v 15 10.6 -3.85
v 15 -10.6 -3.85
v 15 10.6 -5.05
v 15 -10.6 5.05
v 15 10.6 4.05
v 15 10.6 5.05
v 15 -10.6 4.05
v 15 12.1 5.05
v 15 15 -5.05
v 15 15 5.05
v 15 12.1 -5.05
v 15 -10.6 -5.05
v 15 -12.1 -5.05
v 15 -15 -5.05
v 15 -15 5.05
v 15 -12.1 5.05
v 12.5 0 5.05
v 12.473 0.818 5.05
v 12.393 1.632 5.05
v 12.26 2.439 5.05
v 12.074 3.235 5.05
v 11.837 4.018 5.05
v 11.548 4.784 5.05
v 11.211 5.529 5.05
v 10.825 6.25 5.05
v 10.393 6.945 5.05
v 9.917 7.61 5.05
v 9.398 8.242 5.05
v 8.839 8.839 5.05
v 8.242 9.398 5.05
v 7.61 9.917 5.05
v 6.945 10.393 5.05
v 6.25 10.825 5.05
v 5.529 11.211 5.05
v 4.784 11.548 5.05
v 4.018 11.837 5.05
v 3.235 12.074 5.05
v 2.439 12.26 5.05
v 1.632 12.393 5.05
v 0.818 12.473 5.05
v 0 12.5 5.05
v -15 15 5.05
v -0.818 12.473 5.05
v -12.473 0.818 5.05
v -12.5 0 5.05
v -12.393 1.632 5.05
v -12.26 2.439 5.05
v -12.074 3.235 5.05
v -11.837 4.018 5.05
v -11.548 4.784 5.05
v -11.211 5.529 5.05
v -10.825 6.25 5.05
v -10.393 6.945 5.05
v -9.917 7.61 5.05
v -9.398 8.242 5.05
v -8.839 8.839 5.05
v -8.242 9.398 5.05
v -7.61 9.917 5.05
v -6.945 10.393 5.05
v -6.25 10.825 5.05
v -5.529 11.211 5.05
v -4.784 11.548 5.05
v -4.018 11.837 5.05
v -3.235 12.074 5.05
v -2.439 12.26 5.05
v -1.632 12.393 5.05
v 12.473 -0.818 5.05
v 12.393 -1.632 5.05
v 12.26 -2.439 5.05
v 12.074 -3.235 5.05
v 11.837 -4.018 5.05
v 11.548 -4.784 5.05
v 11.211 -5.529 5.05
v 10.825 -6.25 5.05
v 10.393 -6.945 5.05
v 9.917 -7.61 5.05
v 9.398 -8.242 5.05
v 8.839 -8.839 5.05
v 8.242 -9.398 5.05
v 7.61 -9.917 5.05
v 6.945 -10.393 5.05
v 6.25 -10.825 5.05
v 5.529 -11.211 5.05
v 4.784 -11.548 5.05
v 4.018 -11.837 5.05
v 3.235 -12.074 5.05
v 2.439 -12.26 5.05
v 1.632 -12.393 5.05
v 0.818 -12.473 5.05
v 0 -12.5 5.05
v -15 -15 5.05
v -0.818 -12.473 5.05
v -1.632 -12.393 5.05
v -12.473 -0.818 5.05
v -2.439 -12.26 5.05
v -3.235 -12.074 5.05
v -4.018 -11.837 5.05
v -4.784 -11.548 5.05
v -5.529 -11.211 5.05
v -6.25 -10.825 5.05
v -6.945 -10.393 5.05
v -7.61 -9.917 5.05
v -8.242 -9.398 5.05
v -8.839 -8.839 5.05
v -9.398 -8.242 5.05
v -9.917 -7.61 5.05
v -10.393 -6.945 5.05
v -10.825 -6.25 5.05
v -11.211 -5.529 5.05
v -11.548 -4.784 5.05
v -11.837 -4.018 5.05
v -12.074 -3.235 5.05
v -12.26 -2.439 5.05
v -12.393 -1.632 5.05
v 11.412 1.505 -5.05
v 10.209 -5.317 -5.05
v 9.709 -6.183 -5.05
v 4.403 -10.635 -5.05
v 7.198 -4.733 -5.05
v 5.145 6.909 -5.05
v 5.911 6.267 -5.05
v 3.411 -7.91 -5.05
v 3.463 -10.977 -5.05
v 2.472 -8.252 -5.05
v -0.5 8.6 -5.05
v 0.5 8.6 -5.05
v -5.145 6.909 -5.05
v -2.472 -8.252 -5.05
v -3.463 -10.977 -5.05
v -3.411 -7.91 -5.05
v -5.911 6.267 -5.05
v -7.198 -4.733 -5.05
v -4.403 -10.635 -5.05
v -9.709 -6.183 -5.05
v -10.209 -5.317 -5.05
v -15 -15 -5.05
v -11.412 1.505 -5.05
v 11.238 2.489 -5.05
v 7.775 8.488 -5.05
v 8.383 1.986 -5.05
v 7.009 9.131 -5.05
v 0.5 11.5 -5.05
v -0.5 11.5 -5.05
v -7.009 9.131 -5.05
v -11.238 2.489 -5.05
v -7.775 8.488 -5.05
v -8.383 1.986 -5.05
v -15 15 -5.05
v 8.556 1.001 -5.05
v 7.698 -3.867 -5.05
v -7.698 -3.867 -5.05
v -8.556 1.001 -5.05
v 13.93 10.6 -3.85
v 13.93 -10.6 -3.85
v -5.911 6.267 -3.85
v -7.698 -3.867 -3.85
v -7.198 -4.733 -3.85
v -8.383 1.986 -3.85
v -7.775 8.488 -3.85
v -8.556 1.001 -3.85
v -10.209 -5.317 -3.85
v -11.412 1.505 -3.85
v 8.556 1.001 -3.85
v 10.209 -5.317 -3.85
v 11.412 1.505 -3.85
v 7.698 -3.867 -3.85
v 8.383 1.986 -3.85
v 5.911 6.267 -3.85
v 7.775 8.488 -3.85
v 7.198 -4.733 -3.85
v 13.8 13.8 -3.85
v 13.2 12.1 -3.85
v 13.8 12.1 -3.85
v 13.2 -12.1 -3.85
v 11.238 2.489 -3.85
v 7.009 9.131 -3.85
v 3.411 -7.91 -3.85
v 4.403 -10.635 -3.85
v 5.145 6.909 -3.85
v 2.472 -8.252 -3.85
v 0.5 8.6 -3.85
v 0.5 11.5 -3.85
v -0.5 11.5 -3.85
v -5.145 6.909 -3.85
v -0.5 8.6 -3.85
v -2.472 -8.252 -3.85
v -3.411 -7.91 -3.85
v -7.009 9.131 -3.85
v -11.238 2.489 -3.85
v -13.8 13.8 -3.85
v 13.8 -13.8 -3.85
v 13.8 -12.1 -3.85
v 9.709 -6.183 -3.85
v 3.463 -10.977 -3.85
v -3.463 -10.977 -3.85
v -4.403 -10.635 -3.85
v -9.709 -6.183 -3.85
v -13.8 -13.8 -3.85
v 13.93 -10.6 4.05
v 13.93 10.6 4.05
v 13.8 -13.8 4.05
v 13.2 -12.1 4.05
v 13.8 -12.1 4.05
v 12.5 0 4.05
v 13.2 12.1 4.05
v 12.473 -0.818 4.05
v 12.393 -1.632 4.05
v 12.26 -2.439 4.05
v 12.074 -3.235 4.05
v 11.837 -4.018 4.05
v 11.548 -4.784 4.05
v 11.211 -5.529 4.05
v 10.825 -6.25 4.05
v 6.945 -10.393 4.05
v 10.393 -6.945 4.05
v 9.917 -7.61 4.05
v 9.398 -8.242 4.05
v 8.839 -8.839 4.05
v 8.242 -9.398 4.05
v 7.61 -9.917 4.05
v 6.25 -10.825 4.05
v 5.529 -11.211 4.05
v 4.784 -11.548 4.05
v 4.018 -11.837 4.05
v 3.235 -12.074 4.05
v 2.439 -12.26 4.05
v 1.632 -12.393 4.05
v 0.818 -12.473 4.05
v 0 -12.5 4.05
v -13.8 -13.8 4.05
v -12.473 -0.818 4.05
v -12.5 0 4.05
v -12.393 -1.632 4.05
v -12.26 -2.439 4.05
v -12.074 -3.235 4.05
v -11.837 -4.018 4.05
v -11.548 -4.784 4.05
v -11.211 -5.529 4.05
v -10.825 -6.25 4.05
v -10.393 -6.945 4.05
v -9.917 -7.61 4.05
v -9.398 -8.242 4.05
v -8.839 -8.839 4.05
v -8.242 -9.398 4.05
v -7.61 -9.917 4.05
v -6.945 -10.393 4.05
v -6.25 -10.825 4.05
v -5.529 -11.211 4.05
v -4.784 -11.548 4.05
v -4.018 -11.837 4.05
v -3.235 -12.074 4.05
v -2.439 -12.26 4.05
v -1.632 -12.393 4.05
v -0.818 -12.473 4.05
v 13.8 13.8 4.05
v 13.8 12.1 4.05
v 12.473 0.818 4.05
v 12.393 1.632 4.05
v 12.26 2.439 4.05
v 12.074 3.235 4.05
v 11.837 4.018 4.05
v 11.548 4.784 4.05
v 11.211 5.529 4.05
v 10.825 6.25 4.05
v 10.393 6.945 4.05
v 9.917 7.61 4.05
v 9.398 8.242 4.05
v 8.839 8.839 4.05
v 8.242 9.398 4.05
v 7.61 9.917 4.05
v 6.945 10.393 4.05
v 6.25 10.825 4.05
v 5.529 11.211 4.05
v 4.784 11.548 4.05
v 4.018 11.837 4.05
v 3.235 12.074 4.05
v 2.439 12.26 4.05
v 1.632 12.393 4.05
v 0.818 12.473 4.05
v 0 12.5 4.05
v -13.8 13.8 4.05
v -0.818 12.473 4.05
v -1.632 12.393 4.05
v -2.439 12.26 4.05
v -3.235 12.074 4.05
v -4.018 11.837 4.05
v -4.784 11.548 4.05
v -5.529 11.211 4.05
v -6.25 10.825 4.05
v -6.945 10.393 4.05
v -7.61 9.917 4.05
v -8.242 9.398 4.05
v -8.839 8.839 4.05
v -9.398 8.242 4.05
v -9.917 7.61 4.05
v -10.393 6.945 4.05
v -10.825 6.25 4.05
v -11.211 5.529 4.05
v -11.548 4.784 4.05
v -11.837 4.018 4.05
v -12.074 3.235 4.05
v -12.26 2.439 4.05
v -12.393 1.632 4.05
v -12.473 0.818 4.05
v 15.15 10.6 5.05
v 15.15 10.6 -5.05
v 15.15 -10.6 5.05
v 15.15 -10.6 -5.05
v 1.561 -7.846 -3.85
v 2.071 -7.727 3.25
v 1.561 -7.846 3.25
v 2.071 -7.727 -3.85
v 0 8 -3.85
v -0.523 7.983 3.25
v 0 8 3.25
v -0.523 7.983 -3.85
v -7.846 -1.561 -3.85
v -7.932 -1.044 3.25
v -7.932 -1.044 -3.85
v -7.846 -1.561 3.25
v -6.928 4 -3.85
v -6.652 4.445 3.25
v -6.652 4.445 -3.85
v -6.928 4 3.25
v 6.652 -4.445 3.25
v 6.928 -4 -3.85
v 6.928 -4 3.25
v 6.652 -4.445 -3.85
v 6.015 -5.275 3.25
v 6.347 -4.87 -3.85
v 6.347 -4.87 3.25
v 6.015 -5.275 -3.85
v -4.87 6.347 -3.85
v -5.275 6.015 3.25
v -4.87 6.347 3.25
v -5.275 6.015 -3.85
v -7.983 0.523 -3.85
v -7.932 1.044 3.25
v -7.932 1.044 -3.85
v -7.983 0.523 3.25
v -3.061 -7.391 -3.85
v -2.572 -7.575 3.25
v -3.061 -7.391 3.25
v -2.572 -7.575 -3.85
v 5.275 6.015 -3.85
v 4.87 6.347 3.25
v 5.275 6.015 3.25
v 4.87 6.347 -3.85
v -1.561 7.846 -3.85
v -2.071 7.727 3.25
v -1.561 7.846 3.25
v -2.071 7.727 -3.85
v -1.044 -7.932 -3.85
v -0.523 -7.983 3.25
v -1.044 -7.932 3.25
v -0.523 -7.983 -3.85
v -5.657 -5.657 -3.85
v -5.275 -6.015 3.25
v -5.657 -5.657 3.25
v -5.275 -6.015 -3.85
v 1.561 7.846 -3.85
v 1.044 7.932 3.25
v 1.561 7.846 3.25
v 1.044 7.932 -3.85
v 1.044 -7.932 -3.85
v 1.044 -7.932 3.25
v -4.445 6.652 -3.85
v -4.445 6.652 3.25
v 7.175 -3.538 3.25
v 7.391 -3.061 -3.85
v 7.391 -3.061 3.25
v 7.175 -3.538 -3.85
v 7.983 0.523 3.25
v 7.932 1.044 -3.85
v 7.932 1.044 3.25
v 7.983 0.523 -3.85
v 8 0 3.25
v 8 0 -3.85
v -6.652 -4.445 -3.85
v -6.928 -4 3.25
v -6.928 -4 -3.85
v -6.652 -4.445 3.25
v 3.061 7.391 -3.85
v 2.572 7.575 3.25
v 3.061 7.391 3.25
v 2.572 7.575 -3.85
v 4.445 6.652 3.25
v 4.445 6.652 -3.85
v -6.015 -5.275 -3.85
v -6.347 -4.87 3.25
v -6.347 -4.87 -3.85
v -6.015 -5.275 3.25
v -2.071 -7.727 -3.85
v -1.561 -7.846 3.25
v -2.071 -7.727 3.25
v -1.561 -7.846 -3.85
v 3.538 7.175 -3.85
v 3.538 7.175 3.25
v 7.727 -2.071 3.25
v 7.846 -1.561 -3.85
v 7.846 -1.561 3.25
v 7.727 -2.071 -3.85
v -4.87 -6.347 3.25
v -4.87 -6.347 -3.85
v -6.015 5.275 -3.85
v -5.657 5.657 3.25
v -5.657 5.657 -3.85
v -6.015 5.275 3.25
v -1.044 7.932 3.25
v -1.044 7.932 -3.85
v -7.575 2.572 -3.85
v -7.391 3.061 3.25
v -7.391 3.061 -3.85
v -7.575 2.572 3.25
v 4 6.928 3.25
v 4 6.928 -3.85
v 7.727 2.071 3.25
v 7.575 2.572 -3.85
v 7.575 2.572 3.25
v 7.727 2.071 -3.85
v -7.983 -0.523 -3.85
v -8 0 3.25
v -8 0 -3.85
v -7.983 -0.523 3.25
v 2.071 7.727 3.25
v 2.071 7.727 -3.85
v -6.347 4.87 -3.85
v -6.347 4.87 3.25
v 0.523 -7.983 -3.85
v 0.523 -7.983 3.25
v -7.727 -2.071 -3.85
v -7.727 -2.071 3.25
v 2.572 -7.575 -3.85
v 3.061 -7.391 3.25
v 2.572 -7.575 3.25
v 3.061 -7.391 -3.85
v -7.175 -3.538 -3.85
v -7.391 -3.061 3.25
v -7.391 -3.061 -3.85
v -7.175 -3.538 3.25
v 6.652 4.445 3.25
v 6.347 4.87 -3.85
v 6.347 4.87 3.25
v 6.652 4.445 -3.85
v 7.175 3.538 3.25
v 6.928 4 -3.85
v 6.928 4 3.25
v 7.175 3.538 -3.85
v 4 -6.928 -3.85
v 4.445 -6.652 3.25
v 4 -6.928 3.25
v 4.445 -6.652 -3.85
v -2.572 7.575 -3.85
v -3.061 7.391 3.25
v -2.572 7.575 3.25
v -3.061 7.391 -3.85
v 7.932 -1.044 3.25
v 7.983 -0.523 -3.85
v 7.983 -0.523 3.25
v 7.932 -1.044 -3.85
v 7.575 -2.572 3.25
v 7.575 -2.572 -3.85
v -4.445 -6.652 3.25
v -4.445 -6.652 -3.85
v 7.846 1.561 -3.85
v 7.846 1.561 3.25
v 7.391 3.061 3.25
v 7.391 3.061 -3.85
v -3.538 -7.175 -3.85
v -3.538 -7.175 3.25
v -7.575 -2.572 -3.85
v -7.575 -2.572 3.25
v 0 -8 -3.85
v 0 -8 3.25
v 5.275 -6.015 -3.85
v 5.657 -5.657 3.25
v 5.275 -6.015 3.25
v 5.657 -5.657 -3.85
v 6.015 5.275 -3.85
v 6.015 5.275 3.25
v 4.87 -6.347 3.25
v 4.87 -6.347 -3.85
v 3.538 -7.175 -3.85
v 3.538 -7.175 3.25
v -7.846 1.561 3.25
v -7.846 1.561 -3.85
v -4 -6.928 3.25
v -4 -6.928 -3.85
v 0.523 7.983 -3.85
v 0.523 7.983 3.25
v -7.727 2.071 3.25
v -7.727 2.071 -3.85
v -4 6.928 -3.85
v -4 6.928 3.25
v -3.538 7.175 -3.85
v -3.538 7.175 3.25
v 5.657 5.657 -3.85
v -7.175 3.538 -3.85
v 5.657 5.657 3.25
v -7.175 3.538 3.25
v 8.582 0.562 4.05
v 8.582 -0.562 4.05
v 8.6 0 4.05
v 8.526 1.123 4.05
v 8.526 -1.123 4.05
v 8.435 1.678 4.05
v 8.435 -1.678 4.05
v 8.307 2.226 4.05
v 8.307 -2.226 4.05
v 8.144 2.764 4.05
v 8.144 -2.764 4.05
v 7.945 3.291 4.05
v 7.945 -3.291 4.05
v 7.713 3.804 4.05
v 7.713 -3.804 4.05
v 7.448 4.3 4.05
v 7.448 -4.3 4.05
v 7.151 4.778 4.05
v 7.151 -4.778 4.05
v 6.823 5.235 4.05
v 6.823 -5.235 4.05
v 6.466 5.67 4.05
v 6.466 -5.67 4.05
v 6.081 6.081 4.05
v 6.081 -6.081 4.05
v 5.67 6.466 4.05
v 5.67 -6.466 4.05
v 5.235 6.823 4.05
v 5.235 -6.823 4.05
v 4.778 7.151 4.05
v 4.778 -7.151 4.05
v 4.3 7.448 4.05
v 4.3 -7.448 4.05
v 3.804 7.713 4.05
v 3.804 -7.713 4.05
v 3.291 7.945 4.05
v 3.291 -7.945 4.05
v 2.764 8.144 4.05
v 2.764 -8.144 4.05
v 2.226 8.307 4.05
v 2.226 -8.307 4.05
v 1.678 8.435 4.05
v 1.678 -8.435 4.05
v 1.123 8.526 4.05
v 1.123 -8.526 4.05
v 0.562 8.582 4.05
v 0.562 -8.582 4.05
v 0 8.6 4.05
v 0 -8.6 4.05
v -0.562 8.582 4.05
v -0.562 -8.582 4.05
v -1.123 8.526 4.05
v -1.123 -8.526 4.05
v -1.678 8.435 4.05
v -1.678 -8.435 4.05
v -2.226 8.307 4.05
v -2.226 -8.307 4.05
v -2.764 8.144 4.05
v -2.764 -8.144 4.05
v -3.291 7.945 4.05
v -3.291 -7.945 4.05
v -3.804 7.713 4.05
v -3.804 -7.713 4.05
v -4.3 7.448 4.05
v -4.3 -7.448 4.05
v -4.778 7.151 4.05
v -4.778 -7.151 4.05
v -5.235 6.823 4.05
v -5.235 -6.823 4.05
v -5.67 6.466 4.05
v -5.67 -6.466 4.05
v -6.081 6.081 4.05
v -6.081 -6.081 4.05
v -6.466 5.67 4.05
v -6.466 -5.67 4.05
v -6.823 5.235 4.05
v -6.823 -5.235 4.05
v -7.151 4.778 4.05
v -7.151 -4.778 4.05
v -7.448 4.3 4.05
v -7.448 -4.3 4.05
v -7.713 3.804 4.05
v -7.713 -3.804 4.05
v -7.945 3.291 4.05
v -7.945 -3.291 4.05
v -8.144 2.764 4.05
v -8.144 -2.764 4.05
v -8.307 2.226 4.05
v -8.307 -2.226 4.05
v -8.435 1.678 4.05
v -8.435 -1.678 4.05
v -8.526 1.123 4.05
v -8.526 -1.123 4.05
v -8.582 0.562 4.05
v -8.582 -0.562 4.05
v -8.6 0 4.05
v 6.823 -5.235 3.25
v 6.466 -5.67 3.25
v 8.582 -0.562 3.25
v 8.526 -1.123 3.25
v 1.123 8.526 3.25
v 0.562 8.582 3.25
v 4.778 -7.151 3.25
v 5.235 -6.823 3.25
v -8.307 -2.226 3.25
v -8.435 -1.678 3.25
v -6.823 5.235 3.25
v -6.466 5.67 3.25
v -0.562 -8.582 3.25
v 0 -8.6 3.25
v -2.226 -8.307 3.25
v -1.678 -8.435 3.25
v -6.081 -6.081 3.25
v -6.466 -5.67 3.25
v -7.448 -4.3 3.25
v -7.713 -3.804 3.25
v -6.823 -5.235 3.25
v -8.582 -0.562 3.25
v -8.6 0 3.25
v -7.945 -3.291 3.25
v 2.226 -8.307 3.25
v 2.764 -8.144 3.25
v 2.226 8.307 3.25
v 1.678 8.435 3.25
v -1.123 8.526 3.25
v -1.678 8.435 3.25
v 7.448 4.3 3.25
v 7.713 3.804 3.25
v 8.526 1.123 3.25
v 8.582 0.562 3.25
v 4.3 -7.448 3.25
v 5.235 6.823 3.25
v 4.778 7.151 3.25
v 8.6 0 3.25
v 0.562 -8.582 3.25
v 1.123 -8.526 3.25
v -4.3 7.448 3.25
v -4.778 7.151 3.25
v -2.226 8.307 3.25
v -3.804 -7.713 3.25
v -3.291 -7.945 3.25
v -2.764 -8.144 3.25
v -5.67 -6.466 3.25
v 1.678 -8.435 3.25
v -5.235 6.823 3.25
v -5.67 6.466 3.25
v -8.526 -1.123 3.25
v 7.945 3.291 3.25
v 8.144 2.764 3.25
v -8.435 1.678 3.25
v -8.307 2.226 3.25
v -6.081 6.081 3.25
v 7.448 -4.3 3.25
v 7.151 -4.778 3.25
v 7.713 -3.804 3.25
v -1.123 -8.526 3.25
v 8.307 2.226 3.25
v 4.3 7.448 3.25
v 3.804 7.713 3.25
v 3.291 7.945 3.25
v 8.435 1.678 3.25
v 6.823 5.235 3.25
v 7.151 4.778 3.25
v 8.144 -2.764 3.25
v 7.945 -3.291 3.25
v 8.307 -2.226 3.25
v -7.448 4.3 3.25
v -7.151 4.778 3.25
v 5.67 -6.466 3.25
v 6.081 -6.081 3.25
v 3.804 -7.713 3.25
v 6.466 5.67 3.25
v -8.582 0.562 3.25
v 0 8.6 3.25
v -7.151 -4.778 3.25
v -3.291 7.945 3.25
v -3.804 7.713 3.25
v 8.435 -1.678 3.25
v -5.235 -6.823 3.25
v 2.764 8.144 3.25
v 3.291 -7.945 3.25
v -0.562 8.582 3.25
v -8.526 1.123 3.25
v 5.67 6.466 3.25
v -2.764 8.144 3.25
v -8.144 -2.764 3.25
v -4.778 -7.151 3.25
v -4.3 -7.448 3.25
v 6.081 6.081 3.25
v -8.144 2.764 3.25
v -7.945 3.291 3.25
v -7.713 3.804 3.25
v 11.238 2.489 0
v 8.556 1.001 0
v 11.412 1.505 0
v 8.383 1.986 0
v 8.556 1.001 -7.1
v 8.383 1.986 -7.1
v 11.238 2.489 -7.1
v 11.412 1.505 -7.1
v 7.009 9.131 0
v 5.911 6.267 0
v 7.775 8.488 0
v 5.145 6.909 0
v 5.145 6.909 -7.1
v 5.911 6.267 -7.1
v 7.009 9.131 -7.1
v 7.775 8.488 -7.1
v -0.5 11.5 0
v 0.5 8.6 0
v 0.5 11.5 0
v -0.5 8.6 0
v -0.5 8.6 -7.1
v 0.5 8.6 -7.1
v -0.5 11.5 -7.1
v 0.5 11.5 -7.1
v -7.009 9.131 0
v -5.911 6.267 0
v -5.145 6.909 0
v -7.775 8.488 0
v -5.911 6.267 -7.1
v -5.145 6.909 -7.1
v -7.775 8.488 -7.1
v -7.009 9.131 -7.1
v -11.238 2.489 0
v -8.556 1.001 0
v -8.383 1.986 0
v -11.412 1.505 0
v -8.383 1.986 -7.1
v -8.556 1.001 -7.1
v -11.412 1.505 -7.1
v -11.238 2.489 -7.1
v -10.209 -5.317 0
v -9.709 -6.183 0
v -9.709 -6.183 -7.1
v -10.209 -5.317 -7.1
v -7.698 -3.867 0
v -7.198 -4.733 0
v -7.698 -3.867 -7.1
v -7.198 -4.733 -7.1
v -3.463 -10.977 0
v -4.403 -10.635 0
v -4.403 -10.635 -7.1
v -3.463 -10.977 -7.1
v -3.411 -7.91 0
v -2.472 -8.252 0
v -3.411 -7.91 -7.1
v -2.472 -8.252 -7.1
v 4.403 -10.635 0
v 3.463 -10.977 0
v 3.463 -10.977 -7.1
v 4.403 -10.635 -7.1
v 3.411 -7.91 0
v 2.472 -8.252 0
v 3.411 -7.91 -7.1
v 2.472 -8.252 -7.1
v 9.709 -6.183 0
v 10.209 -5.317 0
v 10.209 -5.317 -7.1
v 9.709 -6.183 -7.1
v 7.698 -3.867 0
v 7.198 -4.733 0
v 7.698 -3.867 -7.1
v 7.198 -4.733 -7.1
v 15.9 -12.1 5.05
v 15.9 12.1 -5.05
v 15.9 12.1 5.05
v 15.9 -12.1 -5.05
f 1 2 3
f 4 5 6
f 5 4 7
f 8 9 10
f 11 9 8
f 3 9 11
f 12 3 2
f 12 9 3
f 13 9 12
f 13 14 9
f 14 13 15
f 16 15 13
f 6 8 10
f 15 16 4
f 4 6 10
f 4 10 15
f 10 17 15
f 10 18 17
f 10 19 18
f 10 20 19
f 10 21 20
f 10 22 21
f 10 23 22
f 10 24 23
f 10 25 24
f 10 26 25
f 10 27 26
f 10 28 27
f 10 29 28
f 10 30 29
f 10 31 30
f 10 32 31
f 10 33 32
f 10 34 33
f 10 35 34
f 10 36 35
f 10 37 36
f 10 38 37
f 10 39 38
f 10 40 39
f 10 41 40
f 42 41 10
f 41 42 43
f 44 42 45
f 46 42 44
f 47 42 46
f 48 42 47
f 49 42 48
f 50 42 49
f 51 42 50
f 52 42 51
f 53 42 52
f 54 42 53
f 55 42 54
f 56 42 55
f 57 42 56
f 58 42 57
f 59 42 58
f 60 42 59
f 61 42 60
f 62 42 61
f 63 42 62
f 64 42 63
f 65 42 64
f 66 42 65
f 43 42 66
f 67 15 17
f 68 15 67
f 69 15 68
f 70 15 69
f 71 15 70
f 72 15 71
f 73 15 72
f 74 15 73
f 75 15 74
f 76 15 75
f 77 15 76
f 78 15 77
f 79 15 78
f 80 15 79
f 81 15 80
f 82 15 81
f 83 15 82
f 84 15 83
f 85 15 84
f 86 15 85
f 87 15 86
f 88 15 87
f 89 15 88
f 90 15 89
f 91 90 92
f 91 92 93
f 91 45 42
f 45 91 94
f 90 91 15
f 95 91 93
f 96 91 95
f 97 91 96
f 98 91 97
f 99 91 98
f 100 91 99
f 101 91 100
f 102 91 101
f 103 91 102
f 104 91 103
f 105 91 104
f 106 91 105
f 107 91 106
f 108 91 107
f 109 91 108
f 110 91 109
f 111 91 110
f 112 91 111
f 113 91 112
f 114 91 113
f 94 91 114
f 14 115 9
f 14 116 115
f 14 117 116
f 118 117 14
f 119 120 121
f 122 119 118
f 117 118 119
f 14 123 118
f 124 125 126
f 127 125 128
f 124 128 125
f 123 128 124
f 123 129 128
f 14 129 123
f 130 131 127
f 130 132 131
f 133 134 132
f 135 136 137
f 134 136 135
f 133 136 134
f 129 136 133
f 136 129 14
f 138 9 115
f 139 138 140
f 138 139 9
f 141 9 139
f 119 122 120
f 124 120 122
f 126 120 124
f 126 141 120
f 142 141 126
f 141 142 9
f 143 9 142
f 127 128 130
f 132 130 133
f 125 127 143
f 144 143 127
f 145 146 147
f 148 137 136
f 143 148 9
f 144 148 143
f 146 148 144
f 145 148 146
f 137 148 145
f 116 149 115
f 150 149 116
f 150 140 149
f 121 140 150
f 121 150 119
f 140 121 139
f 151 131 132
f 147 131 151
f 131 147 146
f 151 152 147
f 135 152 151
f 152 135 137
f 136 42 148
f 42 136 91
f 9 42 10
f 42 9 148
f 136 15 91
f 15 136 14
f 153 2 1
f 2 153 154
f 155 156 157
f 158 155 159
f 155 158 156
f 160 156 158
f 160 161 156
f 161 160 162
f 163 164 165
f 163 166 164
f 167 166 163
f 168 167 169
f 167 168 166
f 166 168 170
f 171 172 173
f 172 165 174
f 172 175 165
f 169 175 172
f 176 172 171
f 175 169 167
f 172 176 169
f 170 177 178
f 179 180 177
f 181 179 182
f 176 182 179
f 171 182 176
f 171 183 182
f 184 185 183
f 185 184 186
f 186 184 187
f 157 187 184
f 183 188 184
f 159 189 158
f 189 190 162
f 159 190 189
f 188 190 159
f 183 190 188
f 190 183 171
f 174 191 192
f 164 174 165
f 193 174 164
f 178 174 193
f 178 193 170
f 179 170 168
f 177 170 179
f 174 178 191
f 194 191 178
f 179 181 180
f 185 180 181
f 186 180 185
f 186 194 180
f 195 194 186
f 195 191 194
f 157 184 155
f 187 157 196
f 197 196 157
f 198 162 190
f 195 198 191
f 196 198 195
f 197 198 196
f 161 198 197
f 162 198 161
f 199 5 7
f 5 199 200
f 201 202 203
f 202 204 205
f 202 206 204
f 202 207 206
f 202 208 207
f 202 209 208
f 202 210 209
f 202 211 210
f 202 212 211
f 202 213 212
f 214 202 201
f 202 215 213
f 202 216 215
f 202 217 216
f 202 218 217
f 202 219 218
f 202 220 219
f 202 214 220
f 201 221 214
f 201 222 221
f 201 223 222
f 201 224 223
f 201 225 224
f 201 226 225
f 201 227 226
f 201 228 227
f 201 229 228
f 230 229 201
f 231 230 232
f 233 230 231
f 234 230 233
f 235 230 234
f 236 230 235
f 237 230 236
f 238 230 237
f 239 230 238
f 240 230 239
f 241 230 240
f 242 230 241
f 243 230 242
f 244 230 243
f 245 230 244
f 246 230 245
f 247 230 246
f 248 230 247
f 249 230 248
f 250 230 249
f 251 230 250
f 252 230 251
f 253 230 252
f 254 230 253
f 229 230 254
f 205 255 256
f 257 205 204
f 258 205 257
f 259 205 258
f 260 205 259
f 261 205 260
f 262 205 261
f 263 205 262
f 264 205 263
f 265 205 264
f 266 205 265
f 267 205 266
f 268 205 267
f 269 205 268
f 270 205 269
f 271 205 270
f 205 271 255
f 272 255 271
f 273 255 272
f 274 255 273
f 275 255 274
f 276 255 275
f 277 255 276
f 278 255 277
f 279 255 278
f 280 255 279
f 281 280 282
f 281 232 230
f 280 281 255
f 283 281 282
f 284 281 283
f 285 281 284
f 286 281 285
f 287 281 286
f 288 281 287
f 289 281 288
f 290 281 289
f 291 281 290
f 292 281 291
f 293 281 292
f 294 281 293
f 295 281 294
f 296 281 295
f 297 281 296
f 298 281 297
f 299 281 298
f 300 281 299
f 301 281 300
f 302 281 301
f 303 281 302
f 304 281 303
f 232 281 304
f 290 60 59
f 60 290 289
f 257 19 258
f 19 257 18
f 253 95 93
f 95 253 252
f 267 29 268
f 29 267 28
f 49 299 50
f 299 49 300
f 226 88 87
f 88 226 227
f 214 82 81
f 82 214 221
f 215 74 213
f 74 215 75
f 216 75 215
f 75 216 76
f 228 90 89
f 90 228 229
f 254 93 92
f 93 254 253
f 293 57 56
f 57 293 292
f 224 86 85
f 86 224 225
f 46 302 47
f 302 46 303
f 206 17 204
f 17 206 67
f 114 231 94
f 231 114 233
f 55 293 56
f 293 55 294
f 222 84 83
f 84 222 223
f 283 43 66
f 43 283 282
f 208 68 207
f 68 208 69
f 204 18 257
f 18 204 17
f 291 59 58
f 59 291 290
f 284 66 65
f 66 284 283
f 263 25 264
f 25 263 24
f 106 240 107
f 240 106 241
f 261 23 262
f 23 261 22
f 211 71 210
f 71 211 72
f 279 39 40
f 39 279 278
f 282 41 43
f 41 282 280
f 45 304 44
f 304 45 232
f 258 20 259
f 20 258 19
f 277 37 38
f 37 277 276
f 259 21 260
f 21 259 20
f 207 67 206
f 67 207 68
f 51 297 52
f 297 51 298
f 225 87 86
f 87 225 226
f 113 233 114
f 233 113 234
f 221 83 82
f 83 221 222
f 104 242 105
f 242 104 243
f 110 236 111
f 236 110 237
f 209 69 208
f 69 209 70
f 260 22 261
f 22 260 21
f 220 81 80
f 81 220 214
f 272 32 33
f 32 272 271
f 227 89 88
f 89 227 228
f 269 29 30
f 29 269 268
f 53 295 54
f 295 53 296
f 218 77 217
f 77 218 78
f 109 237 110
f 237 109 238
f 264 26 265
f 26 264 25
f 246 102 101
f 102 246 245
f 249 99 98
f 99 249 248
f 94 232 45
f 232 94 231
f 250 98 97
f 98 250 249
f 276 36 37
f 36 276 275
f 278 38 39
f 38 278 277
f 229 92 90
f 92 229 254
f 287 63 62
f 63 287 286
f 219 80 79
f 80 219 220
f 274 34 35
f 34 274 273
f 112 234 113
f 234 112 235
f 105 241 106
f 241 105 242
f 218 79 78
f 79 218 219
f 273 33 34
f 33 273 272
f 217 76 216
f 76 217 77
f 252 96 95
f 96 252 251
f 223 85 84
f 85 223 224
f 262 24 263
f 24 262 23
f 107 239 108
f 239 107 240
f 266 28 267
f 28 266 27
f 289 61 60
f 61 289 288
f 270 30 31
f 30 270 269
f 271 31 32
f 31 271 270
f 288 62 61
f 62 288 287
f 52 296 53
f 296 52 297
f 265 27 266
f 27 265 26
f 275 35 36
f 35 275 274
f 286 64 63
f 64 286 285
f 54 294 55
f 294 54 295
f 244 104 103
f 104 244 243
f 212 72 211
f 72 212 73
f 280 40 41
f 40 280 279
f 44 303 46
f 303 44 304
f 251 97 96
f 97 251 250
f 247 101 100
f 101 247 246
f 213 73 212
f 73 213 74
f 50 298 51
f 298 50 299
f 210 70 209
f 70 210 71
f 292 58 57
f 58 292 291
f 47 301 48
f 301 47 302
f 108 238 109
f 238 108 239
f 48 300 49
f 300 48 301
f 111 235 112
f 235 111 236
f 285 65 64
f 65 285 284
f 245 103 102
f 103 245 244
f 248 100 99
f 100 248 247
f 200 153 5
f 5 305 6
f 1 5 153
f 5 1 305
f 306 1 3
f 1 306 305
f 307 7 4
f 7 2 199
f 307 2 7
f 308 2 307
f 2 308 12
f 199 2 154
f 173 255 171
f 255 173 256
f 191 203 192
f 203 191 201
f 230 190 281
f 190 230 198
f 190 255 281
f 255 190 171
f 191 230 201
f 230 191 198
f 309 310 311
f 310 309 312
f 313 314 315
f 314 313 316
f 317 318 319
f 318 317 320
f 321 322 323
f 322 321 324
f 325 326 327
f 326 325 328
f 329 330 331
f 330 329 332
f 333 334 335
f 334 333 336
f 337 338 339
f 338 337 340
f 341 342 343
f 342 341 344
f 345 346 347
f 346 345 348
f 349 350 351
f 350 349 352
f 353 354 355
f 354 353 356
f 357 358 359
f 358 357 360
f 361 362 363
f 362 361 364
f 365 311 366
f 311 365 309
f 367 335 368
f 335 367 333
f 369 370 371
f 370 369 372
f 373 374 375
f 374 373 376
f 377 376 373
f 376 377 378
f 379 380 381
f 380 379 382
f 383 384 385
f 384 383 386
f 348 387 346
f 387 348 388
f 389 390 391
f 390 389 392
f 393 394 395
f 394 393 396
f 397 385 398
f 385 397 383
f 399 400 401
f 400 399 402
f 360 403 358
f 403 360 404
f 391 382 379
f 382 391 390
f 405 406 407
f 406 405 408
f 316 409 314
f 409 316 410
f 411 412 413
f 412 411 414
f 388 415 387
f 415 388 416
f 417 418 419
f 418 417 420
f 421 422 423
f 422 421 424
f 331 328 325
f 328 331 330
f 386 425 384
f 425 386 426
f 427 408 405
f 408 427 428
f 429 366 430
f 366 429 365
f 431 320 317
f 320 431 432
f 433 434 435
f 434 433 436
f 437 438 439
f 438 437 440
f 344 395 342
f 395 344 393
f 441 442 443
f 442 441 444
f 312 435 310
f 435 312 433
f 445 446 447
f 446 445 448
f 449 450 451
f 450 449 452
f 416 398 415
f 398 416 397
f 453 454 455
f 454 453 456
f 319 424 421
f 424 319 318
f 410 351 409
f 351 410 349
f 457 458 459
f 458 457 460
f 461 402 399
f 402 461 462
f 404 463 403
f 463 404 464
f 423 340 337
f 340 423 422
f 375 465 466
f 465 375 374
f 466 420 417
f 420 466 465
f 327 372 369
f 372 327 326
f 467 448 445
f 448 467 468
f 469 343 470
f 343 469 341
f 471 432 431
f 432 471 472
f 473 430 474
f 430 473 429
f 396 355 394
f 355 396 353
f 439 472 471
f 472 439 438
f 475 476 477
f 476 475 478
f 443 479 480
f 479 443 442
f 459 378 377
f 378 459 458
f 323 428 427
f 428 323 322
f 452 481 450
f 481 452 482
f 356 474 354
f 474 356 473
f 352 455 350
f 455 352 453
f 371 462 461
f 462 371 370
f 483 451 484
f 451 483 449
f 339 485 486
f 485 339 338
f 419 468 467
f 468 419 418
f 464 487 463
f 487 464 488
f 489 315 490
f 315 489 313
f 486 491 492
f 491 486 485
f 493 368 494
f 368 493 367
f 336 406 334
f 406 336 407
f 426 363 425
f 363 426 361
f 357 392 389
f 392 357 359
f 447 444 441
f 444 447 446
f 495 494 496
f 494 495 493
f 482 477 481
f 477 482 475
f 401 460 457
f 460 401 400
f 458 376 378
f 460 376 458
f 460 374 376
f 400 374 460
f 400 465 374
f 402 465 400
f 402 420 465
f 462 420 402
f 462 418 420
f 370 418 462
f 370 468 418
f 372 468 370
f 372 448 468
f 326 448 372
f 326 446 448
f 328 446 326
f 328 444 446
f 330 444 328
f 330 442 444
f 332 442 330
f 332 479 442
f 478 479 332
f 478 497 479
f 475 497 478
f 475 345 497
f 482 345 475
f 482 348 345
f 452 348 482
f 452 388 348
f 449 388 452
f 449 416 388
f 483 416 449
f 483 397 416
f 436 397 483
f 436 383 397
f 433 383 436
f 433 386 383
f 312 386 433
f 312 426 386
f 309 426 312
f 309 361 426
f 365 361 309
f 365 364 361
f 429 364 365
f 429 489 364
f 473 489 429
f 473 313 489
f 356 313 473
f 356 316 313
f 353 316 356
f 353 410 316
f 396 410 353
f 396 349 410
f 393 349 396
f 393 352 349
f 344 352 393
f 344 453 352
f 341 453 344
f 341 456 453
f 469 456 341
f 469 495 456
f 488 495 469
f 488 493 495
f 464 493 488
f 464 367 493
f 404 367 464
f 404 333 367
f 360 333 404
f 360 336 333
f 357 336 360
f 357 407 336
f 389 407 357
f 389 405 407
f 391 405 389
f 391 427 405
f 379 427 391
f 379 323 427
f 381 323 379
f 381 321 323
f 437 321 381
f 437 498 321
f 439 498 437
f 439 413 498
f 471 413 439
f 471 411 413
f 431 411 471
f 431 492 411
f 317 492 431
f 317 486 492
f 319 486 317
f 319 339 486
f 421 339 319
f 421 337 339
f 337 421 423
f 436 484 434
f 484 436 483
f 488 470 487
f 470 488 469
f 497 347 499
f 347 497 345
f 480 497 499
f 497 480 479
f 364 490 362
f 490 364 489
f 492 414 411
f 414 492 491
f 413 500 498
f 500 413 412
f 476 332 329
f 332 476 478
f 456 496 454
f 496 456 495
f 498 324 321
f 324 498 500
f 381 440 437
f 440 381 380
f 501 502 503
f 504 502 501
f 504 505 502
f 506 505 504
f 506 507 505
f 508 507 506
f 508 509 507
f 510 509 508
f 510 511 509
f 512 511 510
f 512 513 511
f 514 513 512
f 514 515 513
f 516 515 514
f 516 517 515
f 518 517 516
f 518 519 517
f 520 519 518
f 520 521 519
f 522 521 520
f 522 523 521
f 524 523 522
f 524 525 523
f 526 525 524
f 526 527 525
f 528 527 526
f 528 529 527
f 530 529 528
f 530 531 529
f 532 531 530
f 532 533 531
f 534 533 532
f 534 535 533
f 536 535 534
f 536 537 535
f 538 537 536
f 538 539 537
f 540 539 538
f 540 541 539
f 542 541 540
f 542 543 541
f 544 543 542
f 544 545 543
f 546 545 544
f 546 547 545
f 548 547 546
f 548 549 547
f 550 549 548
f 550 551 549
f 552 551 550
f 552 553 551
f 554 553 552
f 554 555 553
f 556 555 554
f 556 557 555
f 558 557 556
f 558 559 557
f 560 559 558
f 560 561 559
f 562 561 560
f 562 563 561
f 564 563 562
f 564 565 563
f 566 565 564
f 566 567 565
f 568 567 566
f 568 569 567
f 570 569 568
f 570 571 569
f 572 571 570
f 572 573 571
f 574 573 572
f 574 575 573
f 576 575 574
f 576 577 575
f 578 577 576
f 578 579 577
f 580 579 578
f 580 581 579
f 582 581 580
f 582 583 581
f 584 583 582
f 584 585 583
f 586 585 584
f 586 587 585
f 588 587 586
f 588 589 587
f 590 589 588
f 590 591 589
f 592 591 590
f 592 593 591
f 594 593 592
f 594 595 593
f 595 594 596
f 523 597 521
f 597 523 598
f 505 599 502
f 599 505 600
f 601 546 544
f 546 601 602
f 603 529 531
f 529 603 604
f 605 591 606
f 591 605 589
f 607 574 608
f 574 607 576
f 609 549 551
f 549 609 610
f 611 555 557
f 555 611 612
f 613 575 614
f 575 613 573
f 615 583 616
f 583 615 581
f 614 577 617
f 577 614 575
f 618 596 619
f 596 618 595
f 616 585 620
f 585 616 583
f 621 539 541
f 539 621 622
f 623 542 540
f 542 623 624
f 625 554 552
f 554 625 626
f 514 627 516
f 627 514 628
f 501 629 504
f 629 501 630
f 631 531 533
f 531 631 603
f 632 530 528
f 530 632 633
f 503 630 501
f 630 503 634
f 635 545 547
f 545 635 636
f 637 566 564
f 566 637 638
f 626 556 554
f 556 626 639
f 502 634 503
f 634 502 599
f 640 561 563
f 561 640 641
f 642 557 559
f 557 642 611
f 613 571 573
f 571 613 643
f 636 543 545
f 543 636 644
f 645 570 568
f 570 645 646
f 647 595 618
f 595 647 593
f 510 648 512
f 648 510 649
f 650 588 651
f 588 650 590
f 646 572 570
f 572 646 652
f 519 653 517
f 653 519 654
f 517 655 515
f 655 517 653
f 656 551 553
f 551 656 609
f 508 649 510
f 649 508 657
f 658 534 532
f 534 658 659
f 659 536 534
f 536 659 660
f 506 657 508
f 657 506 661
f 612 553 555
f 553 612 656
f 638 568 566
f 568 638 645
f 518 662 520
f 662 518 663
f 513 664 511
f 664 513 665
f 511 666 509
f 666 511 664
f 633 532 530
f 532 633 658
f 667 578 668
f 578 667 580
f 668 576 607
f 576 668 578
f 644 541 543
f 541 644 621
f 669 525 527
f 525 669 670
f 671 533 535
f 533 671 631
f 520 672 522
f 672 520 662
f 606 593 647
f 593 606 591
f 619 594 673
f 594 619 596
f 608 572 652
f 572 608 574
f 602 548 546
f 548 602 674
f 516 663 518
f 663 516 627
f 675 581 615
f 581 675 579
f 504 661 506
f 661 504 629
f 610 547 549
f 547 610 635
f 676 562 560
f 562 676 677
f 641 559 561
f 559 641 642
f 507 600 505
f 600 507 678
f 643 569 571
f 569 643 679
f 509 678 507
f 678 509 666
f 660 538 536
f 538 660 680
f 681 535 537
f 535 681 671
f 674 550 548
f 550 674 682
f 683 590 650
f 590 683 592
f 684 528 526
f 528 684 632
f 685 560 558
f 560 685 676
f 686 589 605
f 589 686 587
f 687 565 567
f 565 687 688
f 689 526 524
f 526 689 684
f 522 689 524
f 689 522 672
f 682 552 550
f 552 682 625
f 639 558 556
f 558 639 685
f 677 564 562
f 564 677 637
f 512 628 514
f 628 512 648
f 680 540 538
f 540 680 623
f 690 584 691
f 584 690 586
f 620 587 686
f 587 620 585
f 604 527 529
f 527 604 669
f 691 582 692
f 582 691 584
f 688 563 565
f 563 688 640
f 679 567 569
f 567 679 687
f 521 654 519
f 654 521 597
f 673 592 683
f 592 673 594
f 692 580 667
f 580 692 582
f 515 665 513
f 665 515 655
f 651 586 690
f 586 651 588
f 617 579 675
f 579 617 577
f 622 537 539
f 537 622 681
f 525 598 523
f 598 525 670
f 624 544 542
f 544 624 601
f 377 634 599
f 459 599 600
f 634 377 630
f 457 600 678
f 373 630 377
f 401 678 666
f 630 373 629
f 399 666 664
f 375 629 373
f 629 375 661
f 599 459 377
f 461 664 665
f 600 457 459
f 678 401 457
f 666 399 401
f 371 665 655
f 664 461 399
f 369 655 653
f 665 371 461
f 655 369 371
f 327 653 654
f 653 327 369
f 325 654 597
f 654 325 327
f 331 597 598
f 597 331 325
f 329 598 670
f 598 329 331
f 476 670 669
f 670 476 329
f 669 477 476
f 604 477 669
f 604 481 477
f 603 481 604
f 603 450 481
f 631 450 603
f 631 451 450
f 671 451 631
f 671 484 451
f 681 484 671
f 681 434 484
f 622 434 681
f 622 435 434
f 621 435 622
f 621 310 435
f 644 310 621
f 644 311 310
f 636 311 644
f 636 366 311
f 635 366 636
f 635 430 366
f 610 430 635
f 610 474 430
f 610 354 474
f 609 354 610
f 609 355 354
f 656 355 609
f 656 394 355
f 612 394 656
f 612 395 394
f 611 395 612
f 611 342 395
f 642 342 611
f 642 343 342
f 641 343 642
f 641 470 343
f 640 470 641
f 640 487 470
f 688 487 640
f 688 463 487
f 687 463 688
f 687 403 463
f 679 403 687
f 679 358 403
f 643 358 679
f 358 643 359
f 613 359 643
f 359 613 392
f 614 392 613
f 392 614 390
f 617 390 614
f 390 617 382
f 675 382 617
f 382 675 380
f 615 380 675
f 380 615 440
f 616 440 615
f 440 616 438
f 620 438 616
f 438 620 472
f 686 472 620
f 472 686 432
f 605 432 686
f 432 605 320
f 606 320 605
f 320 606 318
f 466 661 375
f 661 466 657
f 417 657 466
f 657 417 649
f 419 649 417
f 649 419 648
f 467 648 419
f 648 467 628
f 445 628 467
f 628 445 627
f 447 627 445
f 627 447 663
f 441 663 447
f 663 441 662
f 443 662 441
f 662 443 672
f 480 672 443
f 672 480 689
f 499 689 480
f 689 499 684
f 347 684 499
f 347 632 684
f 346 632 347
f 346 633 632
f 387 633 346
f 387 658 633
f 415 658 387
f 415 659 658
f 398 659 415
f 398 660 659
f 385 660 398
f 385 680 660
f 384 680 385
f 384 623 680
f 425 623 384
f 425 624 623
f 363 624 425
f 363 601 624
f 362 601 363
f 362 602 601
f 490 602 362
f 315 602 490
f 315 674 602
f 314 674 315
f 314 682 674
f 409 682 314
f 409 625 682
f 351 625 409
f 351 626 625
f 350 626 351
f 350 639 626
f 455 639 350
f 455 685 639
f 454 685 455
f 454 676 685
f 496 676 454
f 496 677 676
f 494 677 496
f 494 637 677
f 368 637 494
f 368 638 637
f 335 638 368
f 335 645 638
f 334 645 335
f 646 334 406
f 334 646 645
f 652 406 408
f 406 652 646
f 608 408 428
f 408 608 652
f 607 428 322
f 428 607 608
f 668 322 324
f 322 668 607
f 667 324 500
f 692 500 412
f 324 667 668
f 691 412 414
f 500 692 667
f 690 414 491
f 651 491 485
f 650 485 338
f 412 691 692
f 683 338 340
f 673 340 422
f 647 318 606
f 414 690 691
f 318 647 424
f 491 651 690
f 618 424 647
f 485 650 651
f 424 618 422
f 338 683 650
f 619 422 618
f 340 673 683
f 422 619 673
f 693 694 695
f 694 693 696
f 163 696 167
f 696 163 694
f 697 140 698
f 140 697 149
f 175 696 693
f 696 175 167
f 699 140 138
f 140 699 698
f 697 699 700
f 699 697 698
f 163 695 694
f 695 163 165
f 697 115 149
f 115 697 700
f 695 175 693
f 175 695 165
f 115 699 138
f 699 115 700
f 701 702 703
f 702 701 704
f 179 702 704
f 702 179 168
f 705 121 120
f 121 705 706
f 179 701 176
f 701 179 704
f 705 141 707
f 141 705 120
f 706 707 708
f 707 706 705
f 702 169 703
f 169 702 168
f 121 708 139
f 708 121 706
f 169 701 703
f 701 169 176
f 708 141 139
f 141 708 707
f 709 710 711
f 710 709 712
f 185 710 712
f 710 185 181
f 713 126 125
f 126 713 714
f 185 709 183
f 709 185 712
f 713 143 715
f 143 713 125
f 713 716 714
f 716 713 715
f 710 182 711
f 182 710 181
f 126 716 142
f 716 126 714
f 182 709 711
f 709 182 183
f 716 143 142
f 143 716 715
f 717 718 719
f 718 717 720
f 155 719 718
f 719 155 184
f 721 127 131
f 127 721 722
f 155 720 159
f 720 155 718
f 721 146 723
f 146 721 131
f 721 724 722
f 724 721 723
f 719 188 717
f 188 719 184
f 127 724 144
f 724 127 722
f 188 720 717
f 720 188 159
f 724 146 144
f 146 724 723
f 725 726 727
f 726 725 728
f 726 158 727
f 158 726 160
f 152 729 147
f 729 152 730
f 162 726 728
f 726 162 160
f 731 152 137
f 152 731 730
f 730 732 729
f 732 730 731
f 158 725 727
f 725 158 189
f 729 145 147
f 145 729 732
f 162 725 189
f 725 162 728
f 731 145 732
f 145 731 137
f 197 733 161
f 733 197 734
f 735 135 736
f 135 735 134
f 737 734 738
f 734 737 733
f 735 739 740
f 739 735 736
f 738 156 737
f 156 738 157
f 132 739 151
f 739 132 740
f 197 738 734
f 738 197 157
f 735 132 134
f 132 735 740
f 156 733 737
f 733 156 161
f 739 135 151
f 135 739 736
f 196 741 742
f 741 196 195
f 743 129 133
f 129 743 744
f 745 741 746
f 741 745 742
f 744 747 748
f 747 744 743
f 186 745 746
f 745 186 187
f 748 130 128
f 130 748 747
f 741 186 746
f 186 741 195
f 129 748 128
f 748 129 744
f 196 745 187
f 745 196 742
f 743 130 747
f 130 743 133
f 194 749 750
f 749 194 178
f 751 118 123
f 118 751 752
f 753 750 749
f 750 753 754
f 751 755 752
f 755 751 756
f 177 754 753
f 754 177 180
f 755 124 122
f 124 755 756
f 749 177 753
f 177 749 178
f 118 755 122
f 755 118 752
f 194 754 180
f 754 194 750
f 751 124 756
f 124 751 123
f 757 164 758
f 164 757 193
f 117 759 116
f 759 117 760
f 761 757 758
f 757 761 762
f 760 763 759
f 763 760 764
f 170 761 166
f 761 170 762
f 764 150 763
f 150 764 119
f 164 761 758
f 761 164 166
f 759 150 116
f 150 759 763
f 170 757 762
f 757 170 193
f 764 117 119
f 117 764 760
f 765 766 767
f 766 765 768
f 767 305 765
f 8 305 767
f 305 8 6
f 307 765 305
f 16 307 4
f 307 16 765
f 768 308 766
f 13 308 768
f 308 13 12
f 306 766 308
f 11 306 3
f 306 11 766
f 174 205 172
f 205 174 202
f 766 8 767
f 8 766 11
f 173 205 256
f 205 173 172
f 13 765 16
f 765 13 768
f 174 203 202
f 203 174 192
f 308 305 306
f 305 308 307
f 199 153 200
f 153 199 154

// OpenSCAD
$fn = 96;

envelope_x = 30;
envelope_y = 30;
depth = 10.1;

intake_d = 25;
exit_w = 21.2;
hub_d = 16;

// Wall/feature params (not specified explicitly)
wall = 1.2;
base_th = 1.2;
cover_th = 1.0;
hub_h = depth - base_th - cover_th;
hub_top_rim = 0.8;

module blower_body() {
    difference() {
        // Outer envelope
        translate([-envelope_x/2, -envelope_y/2, 0])
            cube([envelope_x, envelope_y, depth], center=false);

        // Internal cavity: volute-like (cylindrical cavity plus exit duct cut)
        translate([0, 0, base_th])
            cylinder(h=depth - base_th - cover_th, d=intake_d + 2*( (envelope_x - intake_d)/2 - wall ), center=false);

        // Intake opening through top cover
        translate([0, 0, depth - cover_th - 0.01])
            cylinder(h=cover_th + 0.02, d=intake_d, center=false);

        // Exit port cutout on +X side (through full depth, minus walls)
        translate([envelope_x/2 - wall - 0.01, -exit_w/2, base_th])
            cube([wall + 0.02, exit_w, depth - base_th - cover_th], center=false);

        // Slight interior relief to ensure flow path (squared volute pocket)
        translate([-envelope_x/2 + wall, -envelope_y/2 + wall, base_th])
            cube([envelope_x - 2*wall, envelope_y - 2*wall, depth - base_th - cover_th], center=false);

        // Keep outer corners thicker by re-adding (done by subtracting a rounded-ish pocket)
        // Use a smaller cylinder pocket to avoid over-thinning near corners
        translate([0, 0, base_th])
            cylinder(h=depth - base_th - cover_th, d=envelope_x - 2*wall - 6, center=false);
    }
}

module rotor_hub() {
    // Rotor hub centered inside, slightly recessed from top cover
    translate([0, 0, base_th])
    union() {
        cylinder(h=hub_h, d=hub_d, center=false);
        // small top rim
        translate([0, 0, hub_h - hub_top_rim])
            cylinder(h=hub_top_rim, d=hub_d + 1.2, center=false);
    }
}

module blades() {
    // Simple radial impeller blades inside cavity
    blade_count = 9;
    blade_th = 1.0;
    blade_h = hub_h - 0.8;
    r_inner = hub_d/2 + 0.6;
    r_outer = intake_d/2 - 1.0;

    translate([0, 0, base_th + 0.3])
    for (i = [0:blade_count-1]) {
        rotate([0, 0, i*360/blade_count + 10])
        translate([ (r_inner + r_outer)/2, 0, 0 ])
            cube([r_outer - r_inner, blade_th, blade_h], center=true);
    }
}

module exit_nozzle_lip() {
    // A small external lip around the exit port
    lip_t = 1.2;
    lip_out = 1.5;
    translate([envelope_x/2 - lip_t, 0, depth/2])
    difference() {
        translate([lip_out/2, 0, 0])
            cube([lip_t + lip_out, exit_w + 2*lip_out, depth], center=true);
        translate([lip_out/2 - 0.01, 0, 0])
            cube([lip_t + 0.02, exit_w, depth + 0.2], center=true);
    }
}

module blower_fan() {
    union() {
        blower_body();
        // Rotor features (solid visible through intake)
        rotor_hub();
        blades();
        exit_nozzle_lip();
    }
}

// Center model about origin in X/Y; base on Z=0. Move to be centered in Z.
translate([0, 0, -depth/2])
    blower_fan();
